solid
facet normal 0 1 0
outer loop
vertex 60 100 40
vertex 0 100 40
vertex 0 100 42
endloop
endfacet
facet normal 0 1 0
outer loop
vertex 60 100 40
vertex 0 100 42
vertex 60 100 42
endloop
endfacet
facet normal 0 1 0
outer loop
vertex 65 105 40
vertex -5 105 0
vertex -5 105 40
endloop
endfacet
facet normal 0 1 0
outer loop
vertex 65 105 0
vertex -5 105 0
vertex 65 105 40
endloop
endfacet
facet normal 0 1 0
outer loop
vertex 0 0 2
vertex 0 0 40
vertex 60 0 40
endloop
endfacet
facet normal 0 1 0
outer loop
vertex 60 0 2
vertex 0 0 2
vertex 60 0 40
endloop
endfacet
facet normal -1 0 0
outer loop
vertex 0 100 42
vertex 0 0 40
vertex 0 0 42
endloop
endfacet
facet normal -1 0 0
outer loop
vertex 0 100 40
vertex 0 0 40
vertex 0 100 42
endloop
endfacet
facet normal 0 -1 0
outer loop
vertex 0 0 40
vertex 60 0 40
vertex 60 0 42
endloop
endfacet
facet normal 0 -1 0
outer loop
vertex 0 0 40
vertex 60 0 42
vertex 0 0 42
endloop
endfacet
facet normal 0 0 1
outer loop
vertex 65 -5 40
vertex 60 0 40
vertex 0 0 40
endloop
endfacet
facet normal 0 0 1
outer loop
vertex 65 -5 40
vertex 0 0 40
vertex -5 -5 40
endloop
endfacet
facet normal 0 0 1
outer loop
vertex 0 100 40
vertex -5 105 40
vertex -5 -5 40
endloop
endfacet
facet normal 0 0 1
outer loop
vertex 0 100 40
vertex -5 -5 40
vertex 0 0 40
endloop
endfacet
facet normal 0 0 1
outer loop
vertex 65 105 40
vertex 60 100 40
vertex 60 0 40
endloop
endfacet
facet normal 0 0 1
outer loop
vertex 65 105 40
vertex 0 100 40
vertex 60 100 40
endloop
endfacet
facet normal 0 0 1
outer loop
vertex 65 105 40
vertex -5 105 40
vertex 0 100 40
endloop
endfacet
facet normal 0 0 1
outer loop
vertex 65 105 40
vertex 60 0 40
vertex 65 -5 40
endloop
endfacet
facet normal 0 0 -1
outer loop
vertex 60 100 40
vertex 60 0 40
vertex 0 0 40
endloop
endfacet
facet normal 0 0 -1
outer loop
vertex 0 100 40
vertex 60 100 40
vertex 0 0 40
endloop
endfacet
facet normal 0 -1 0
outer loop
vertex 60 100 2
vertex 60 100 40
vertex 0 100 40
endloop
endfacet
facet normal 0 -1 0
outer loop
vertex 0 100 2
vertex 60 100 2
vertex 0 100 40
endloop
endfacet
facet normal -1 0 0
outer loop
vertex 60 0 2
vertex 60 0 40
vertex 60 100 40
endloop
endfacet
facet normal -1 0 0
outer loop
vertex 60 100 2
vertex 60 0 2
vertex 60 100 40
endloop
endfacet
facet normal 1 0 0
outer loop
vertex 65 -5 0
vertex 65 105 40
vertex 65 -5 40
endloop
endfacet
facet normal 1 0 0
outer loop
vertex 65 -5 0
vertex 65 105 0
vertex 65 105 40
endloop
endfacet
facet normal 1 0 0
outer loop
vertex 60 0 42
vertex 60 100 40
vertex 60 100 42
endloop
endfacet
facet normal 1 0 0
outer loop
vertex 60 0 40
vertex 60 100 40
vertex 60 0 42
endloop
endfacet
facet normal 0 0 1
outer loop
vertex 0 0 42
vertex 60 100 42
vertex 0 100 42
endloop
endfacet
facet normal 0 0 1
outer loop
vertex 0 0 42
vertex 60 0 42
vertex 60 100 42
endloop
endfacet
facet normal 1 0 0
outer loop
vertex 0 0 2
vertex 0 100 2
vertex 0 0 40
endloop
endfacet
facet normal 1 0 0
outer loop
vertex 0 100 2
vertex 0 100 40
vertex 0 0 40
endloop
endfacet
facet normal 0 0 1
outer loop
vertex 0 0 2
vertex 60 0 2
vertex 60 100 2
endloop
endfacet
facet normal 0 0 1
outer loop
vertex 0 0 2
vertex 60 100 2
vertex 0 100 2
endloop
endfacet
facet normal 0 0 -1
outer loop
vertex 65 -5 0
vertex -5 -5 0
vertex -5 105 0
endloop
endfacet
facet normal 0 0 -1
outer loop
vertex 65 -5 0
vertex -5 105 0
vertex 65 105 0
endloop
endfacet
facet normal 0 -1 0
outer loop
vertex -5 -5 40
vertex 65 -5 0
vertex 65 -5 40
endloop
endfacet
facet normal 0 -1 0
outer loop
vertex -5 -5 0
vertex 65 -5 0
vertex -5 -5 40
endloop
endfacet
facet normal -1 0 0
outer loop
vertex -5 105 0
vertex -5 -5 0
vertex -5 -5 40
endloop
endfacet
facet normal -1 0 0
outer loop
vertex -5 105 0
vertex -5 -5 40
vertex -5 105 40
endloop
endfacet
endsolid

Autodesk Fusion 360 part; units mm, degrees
sketch "Boceto1" plane through (0, 0, 0) normal (0, 0, 1) x (1, 0, 0)
  line L0 (0, 0) -> (60, 0)
  line L1 (60, 0) -> (60, 100)
  line L2 (60, 100) -> (0, 100)
  line L3 (0, 100) -> (0, 0)
  line L4 (65, -5) -> (-5, -5)
  line L5 (-5, -5) -> (-5, 105)
  line L6 (-5, 105) -> (65, 105)
  line L7 (65, 105) -> (65, -5)
  line L8 (0, 75) -> (60, 75)
  line L9 (60, 75) -> (60, 100)
  line L10 (60, 100) -> (0, 100)
  line L11 (0, 100) -> (0, 75)
  dimension "d1" = 100
  dimension "d2" = 60
  dimension "d3" = 110
  dimension "d4" = 70
extrude "Extruir1" add sketch "Boceto1" along normal blind 40 contours L0 L1 L3 L8 | L1 L2 L3 L8 L9 L10 L11 | L4 L5 L6 L7 makes body 1
sketch "Boceto3" plane through (0, 0, 40) normal (0, 0, 1) x (-1, 0, 0)
  line L0 (-65, -105) -> (5, -105)
  line L1 (5, -105) -> (5, 5)
  line L2 (5, 5) -> (-65, 5)
  line L3 (-65, 5) -> (-65, -105)
  line L4 (-60, 0) -> (-60, -100)
  line L5 (-60, -100) -> (0, -100)
  line L6 (0, -100) -> (0, 0)
  line L7 (0, 0) -> (-60, 0)
  dimension "d8" = -5
extrude "Extruir2" cut sketch "Boceto3" against normal blind 38 contours L4 L5 L6 L7 bodies 1
sketch "Boceto4" plane through (0, 0, 40) normal (0, 0, 1) x (-1, 0, 0)
  line L0 (-60, -100) -> (-60, 0)
  line L1 (-60, 0) -> (0, 0)
  line L2 (0, 0) -> (0, -100)
  line L3 (0, -100) -> (-60, -100)
  line L4 (-65, -105) -> (5, -105)
  line L5 (5, -105) -> (5, 5)
  line L6 (5, 5) -> (-65, 5)
  line L7 (-65, 5) -> (-65, -105)
sketch "Boceto5" plane through (0, 0, 40) normal (0, 0, 1) x (-1, 0, 0)
  line L0 (-60, -100) -> (-60, 0)
  line L1 (-60, 0) -> (0, 0)
  line L2 (0, 0) -> (0, -100)
  line L3 (0, -100) -> (-60, -100)
  line L4 (-65, -105) -> (5, -105)
  line L5 (5, -105) -> (5, 5)
  line L6 (5, 5) -> (-65, 5)
  line L7 (-65, 5) -> (-65, -105)
  line L8 (-30.0059, -70.0059) -> (-29.9941, -70.0059)
  line L9 (-29.9941, -29.9941) -> (-30.0059, -29.9941)
  dimension "d18" = -34.9941
extrude "Extruir6" add sketch "Boceto5" along normal blind 2 separate body contours L0 L1 L2 L3 makes body 2
